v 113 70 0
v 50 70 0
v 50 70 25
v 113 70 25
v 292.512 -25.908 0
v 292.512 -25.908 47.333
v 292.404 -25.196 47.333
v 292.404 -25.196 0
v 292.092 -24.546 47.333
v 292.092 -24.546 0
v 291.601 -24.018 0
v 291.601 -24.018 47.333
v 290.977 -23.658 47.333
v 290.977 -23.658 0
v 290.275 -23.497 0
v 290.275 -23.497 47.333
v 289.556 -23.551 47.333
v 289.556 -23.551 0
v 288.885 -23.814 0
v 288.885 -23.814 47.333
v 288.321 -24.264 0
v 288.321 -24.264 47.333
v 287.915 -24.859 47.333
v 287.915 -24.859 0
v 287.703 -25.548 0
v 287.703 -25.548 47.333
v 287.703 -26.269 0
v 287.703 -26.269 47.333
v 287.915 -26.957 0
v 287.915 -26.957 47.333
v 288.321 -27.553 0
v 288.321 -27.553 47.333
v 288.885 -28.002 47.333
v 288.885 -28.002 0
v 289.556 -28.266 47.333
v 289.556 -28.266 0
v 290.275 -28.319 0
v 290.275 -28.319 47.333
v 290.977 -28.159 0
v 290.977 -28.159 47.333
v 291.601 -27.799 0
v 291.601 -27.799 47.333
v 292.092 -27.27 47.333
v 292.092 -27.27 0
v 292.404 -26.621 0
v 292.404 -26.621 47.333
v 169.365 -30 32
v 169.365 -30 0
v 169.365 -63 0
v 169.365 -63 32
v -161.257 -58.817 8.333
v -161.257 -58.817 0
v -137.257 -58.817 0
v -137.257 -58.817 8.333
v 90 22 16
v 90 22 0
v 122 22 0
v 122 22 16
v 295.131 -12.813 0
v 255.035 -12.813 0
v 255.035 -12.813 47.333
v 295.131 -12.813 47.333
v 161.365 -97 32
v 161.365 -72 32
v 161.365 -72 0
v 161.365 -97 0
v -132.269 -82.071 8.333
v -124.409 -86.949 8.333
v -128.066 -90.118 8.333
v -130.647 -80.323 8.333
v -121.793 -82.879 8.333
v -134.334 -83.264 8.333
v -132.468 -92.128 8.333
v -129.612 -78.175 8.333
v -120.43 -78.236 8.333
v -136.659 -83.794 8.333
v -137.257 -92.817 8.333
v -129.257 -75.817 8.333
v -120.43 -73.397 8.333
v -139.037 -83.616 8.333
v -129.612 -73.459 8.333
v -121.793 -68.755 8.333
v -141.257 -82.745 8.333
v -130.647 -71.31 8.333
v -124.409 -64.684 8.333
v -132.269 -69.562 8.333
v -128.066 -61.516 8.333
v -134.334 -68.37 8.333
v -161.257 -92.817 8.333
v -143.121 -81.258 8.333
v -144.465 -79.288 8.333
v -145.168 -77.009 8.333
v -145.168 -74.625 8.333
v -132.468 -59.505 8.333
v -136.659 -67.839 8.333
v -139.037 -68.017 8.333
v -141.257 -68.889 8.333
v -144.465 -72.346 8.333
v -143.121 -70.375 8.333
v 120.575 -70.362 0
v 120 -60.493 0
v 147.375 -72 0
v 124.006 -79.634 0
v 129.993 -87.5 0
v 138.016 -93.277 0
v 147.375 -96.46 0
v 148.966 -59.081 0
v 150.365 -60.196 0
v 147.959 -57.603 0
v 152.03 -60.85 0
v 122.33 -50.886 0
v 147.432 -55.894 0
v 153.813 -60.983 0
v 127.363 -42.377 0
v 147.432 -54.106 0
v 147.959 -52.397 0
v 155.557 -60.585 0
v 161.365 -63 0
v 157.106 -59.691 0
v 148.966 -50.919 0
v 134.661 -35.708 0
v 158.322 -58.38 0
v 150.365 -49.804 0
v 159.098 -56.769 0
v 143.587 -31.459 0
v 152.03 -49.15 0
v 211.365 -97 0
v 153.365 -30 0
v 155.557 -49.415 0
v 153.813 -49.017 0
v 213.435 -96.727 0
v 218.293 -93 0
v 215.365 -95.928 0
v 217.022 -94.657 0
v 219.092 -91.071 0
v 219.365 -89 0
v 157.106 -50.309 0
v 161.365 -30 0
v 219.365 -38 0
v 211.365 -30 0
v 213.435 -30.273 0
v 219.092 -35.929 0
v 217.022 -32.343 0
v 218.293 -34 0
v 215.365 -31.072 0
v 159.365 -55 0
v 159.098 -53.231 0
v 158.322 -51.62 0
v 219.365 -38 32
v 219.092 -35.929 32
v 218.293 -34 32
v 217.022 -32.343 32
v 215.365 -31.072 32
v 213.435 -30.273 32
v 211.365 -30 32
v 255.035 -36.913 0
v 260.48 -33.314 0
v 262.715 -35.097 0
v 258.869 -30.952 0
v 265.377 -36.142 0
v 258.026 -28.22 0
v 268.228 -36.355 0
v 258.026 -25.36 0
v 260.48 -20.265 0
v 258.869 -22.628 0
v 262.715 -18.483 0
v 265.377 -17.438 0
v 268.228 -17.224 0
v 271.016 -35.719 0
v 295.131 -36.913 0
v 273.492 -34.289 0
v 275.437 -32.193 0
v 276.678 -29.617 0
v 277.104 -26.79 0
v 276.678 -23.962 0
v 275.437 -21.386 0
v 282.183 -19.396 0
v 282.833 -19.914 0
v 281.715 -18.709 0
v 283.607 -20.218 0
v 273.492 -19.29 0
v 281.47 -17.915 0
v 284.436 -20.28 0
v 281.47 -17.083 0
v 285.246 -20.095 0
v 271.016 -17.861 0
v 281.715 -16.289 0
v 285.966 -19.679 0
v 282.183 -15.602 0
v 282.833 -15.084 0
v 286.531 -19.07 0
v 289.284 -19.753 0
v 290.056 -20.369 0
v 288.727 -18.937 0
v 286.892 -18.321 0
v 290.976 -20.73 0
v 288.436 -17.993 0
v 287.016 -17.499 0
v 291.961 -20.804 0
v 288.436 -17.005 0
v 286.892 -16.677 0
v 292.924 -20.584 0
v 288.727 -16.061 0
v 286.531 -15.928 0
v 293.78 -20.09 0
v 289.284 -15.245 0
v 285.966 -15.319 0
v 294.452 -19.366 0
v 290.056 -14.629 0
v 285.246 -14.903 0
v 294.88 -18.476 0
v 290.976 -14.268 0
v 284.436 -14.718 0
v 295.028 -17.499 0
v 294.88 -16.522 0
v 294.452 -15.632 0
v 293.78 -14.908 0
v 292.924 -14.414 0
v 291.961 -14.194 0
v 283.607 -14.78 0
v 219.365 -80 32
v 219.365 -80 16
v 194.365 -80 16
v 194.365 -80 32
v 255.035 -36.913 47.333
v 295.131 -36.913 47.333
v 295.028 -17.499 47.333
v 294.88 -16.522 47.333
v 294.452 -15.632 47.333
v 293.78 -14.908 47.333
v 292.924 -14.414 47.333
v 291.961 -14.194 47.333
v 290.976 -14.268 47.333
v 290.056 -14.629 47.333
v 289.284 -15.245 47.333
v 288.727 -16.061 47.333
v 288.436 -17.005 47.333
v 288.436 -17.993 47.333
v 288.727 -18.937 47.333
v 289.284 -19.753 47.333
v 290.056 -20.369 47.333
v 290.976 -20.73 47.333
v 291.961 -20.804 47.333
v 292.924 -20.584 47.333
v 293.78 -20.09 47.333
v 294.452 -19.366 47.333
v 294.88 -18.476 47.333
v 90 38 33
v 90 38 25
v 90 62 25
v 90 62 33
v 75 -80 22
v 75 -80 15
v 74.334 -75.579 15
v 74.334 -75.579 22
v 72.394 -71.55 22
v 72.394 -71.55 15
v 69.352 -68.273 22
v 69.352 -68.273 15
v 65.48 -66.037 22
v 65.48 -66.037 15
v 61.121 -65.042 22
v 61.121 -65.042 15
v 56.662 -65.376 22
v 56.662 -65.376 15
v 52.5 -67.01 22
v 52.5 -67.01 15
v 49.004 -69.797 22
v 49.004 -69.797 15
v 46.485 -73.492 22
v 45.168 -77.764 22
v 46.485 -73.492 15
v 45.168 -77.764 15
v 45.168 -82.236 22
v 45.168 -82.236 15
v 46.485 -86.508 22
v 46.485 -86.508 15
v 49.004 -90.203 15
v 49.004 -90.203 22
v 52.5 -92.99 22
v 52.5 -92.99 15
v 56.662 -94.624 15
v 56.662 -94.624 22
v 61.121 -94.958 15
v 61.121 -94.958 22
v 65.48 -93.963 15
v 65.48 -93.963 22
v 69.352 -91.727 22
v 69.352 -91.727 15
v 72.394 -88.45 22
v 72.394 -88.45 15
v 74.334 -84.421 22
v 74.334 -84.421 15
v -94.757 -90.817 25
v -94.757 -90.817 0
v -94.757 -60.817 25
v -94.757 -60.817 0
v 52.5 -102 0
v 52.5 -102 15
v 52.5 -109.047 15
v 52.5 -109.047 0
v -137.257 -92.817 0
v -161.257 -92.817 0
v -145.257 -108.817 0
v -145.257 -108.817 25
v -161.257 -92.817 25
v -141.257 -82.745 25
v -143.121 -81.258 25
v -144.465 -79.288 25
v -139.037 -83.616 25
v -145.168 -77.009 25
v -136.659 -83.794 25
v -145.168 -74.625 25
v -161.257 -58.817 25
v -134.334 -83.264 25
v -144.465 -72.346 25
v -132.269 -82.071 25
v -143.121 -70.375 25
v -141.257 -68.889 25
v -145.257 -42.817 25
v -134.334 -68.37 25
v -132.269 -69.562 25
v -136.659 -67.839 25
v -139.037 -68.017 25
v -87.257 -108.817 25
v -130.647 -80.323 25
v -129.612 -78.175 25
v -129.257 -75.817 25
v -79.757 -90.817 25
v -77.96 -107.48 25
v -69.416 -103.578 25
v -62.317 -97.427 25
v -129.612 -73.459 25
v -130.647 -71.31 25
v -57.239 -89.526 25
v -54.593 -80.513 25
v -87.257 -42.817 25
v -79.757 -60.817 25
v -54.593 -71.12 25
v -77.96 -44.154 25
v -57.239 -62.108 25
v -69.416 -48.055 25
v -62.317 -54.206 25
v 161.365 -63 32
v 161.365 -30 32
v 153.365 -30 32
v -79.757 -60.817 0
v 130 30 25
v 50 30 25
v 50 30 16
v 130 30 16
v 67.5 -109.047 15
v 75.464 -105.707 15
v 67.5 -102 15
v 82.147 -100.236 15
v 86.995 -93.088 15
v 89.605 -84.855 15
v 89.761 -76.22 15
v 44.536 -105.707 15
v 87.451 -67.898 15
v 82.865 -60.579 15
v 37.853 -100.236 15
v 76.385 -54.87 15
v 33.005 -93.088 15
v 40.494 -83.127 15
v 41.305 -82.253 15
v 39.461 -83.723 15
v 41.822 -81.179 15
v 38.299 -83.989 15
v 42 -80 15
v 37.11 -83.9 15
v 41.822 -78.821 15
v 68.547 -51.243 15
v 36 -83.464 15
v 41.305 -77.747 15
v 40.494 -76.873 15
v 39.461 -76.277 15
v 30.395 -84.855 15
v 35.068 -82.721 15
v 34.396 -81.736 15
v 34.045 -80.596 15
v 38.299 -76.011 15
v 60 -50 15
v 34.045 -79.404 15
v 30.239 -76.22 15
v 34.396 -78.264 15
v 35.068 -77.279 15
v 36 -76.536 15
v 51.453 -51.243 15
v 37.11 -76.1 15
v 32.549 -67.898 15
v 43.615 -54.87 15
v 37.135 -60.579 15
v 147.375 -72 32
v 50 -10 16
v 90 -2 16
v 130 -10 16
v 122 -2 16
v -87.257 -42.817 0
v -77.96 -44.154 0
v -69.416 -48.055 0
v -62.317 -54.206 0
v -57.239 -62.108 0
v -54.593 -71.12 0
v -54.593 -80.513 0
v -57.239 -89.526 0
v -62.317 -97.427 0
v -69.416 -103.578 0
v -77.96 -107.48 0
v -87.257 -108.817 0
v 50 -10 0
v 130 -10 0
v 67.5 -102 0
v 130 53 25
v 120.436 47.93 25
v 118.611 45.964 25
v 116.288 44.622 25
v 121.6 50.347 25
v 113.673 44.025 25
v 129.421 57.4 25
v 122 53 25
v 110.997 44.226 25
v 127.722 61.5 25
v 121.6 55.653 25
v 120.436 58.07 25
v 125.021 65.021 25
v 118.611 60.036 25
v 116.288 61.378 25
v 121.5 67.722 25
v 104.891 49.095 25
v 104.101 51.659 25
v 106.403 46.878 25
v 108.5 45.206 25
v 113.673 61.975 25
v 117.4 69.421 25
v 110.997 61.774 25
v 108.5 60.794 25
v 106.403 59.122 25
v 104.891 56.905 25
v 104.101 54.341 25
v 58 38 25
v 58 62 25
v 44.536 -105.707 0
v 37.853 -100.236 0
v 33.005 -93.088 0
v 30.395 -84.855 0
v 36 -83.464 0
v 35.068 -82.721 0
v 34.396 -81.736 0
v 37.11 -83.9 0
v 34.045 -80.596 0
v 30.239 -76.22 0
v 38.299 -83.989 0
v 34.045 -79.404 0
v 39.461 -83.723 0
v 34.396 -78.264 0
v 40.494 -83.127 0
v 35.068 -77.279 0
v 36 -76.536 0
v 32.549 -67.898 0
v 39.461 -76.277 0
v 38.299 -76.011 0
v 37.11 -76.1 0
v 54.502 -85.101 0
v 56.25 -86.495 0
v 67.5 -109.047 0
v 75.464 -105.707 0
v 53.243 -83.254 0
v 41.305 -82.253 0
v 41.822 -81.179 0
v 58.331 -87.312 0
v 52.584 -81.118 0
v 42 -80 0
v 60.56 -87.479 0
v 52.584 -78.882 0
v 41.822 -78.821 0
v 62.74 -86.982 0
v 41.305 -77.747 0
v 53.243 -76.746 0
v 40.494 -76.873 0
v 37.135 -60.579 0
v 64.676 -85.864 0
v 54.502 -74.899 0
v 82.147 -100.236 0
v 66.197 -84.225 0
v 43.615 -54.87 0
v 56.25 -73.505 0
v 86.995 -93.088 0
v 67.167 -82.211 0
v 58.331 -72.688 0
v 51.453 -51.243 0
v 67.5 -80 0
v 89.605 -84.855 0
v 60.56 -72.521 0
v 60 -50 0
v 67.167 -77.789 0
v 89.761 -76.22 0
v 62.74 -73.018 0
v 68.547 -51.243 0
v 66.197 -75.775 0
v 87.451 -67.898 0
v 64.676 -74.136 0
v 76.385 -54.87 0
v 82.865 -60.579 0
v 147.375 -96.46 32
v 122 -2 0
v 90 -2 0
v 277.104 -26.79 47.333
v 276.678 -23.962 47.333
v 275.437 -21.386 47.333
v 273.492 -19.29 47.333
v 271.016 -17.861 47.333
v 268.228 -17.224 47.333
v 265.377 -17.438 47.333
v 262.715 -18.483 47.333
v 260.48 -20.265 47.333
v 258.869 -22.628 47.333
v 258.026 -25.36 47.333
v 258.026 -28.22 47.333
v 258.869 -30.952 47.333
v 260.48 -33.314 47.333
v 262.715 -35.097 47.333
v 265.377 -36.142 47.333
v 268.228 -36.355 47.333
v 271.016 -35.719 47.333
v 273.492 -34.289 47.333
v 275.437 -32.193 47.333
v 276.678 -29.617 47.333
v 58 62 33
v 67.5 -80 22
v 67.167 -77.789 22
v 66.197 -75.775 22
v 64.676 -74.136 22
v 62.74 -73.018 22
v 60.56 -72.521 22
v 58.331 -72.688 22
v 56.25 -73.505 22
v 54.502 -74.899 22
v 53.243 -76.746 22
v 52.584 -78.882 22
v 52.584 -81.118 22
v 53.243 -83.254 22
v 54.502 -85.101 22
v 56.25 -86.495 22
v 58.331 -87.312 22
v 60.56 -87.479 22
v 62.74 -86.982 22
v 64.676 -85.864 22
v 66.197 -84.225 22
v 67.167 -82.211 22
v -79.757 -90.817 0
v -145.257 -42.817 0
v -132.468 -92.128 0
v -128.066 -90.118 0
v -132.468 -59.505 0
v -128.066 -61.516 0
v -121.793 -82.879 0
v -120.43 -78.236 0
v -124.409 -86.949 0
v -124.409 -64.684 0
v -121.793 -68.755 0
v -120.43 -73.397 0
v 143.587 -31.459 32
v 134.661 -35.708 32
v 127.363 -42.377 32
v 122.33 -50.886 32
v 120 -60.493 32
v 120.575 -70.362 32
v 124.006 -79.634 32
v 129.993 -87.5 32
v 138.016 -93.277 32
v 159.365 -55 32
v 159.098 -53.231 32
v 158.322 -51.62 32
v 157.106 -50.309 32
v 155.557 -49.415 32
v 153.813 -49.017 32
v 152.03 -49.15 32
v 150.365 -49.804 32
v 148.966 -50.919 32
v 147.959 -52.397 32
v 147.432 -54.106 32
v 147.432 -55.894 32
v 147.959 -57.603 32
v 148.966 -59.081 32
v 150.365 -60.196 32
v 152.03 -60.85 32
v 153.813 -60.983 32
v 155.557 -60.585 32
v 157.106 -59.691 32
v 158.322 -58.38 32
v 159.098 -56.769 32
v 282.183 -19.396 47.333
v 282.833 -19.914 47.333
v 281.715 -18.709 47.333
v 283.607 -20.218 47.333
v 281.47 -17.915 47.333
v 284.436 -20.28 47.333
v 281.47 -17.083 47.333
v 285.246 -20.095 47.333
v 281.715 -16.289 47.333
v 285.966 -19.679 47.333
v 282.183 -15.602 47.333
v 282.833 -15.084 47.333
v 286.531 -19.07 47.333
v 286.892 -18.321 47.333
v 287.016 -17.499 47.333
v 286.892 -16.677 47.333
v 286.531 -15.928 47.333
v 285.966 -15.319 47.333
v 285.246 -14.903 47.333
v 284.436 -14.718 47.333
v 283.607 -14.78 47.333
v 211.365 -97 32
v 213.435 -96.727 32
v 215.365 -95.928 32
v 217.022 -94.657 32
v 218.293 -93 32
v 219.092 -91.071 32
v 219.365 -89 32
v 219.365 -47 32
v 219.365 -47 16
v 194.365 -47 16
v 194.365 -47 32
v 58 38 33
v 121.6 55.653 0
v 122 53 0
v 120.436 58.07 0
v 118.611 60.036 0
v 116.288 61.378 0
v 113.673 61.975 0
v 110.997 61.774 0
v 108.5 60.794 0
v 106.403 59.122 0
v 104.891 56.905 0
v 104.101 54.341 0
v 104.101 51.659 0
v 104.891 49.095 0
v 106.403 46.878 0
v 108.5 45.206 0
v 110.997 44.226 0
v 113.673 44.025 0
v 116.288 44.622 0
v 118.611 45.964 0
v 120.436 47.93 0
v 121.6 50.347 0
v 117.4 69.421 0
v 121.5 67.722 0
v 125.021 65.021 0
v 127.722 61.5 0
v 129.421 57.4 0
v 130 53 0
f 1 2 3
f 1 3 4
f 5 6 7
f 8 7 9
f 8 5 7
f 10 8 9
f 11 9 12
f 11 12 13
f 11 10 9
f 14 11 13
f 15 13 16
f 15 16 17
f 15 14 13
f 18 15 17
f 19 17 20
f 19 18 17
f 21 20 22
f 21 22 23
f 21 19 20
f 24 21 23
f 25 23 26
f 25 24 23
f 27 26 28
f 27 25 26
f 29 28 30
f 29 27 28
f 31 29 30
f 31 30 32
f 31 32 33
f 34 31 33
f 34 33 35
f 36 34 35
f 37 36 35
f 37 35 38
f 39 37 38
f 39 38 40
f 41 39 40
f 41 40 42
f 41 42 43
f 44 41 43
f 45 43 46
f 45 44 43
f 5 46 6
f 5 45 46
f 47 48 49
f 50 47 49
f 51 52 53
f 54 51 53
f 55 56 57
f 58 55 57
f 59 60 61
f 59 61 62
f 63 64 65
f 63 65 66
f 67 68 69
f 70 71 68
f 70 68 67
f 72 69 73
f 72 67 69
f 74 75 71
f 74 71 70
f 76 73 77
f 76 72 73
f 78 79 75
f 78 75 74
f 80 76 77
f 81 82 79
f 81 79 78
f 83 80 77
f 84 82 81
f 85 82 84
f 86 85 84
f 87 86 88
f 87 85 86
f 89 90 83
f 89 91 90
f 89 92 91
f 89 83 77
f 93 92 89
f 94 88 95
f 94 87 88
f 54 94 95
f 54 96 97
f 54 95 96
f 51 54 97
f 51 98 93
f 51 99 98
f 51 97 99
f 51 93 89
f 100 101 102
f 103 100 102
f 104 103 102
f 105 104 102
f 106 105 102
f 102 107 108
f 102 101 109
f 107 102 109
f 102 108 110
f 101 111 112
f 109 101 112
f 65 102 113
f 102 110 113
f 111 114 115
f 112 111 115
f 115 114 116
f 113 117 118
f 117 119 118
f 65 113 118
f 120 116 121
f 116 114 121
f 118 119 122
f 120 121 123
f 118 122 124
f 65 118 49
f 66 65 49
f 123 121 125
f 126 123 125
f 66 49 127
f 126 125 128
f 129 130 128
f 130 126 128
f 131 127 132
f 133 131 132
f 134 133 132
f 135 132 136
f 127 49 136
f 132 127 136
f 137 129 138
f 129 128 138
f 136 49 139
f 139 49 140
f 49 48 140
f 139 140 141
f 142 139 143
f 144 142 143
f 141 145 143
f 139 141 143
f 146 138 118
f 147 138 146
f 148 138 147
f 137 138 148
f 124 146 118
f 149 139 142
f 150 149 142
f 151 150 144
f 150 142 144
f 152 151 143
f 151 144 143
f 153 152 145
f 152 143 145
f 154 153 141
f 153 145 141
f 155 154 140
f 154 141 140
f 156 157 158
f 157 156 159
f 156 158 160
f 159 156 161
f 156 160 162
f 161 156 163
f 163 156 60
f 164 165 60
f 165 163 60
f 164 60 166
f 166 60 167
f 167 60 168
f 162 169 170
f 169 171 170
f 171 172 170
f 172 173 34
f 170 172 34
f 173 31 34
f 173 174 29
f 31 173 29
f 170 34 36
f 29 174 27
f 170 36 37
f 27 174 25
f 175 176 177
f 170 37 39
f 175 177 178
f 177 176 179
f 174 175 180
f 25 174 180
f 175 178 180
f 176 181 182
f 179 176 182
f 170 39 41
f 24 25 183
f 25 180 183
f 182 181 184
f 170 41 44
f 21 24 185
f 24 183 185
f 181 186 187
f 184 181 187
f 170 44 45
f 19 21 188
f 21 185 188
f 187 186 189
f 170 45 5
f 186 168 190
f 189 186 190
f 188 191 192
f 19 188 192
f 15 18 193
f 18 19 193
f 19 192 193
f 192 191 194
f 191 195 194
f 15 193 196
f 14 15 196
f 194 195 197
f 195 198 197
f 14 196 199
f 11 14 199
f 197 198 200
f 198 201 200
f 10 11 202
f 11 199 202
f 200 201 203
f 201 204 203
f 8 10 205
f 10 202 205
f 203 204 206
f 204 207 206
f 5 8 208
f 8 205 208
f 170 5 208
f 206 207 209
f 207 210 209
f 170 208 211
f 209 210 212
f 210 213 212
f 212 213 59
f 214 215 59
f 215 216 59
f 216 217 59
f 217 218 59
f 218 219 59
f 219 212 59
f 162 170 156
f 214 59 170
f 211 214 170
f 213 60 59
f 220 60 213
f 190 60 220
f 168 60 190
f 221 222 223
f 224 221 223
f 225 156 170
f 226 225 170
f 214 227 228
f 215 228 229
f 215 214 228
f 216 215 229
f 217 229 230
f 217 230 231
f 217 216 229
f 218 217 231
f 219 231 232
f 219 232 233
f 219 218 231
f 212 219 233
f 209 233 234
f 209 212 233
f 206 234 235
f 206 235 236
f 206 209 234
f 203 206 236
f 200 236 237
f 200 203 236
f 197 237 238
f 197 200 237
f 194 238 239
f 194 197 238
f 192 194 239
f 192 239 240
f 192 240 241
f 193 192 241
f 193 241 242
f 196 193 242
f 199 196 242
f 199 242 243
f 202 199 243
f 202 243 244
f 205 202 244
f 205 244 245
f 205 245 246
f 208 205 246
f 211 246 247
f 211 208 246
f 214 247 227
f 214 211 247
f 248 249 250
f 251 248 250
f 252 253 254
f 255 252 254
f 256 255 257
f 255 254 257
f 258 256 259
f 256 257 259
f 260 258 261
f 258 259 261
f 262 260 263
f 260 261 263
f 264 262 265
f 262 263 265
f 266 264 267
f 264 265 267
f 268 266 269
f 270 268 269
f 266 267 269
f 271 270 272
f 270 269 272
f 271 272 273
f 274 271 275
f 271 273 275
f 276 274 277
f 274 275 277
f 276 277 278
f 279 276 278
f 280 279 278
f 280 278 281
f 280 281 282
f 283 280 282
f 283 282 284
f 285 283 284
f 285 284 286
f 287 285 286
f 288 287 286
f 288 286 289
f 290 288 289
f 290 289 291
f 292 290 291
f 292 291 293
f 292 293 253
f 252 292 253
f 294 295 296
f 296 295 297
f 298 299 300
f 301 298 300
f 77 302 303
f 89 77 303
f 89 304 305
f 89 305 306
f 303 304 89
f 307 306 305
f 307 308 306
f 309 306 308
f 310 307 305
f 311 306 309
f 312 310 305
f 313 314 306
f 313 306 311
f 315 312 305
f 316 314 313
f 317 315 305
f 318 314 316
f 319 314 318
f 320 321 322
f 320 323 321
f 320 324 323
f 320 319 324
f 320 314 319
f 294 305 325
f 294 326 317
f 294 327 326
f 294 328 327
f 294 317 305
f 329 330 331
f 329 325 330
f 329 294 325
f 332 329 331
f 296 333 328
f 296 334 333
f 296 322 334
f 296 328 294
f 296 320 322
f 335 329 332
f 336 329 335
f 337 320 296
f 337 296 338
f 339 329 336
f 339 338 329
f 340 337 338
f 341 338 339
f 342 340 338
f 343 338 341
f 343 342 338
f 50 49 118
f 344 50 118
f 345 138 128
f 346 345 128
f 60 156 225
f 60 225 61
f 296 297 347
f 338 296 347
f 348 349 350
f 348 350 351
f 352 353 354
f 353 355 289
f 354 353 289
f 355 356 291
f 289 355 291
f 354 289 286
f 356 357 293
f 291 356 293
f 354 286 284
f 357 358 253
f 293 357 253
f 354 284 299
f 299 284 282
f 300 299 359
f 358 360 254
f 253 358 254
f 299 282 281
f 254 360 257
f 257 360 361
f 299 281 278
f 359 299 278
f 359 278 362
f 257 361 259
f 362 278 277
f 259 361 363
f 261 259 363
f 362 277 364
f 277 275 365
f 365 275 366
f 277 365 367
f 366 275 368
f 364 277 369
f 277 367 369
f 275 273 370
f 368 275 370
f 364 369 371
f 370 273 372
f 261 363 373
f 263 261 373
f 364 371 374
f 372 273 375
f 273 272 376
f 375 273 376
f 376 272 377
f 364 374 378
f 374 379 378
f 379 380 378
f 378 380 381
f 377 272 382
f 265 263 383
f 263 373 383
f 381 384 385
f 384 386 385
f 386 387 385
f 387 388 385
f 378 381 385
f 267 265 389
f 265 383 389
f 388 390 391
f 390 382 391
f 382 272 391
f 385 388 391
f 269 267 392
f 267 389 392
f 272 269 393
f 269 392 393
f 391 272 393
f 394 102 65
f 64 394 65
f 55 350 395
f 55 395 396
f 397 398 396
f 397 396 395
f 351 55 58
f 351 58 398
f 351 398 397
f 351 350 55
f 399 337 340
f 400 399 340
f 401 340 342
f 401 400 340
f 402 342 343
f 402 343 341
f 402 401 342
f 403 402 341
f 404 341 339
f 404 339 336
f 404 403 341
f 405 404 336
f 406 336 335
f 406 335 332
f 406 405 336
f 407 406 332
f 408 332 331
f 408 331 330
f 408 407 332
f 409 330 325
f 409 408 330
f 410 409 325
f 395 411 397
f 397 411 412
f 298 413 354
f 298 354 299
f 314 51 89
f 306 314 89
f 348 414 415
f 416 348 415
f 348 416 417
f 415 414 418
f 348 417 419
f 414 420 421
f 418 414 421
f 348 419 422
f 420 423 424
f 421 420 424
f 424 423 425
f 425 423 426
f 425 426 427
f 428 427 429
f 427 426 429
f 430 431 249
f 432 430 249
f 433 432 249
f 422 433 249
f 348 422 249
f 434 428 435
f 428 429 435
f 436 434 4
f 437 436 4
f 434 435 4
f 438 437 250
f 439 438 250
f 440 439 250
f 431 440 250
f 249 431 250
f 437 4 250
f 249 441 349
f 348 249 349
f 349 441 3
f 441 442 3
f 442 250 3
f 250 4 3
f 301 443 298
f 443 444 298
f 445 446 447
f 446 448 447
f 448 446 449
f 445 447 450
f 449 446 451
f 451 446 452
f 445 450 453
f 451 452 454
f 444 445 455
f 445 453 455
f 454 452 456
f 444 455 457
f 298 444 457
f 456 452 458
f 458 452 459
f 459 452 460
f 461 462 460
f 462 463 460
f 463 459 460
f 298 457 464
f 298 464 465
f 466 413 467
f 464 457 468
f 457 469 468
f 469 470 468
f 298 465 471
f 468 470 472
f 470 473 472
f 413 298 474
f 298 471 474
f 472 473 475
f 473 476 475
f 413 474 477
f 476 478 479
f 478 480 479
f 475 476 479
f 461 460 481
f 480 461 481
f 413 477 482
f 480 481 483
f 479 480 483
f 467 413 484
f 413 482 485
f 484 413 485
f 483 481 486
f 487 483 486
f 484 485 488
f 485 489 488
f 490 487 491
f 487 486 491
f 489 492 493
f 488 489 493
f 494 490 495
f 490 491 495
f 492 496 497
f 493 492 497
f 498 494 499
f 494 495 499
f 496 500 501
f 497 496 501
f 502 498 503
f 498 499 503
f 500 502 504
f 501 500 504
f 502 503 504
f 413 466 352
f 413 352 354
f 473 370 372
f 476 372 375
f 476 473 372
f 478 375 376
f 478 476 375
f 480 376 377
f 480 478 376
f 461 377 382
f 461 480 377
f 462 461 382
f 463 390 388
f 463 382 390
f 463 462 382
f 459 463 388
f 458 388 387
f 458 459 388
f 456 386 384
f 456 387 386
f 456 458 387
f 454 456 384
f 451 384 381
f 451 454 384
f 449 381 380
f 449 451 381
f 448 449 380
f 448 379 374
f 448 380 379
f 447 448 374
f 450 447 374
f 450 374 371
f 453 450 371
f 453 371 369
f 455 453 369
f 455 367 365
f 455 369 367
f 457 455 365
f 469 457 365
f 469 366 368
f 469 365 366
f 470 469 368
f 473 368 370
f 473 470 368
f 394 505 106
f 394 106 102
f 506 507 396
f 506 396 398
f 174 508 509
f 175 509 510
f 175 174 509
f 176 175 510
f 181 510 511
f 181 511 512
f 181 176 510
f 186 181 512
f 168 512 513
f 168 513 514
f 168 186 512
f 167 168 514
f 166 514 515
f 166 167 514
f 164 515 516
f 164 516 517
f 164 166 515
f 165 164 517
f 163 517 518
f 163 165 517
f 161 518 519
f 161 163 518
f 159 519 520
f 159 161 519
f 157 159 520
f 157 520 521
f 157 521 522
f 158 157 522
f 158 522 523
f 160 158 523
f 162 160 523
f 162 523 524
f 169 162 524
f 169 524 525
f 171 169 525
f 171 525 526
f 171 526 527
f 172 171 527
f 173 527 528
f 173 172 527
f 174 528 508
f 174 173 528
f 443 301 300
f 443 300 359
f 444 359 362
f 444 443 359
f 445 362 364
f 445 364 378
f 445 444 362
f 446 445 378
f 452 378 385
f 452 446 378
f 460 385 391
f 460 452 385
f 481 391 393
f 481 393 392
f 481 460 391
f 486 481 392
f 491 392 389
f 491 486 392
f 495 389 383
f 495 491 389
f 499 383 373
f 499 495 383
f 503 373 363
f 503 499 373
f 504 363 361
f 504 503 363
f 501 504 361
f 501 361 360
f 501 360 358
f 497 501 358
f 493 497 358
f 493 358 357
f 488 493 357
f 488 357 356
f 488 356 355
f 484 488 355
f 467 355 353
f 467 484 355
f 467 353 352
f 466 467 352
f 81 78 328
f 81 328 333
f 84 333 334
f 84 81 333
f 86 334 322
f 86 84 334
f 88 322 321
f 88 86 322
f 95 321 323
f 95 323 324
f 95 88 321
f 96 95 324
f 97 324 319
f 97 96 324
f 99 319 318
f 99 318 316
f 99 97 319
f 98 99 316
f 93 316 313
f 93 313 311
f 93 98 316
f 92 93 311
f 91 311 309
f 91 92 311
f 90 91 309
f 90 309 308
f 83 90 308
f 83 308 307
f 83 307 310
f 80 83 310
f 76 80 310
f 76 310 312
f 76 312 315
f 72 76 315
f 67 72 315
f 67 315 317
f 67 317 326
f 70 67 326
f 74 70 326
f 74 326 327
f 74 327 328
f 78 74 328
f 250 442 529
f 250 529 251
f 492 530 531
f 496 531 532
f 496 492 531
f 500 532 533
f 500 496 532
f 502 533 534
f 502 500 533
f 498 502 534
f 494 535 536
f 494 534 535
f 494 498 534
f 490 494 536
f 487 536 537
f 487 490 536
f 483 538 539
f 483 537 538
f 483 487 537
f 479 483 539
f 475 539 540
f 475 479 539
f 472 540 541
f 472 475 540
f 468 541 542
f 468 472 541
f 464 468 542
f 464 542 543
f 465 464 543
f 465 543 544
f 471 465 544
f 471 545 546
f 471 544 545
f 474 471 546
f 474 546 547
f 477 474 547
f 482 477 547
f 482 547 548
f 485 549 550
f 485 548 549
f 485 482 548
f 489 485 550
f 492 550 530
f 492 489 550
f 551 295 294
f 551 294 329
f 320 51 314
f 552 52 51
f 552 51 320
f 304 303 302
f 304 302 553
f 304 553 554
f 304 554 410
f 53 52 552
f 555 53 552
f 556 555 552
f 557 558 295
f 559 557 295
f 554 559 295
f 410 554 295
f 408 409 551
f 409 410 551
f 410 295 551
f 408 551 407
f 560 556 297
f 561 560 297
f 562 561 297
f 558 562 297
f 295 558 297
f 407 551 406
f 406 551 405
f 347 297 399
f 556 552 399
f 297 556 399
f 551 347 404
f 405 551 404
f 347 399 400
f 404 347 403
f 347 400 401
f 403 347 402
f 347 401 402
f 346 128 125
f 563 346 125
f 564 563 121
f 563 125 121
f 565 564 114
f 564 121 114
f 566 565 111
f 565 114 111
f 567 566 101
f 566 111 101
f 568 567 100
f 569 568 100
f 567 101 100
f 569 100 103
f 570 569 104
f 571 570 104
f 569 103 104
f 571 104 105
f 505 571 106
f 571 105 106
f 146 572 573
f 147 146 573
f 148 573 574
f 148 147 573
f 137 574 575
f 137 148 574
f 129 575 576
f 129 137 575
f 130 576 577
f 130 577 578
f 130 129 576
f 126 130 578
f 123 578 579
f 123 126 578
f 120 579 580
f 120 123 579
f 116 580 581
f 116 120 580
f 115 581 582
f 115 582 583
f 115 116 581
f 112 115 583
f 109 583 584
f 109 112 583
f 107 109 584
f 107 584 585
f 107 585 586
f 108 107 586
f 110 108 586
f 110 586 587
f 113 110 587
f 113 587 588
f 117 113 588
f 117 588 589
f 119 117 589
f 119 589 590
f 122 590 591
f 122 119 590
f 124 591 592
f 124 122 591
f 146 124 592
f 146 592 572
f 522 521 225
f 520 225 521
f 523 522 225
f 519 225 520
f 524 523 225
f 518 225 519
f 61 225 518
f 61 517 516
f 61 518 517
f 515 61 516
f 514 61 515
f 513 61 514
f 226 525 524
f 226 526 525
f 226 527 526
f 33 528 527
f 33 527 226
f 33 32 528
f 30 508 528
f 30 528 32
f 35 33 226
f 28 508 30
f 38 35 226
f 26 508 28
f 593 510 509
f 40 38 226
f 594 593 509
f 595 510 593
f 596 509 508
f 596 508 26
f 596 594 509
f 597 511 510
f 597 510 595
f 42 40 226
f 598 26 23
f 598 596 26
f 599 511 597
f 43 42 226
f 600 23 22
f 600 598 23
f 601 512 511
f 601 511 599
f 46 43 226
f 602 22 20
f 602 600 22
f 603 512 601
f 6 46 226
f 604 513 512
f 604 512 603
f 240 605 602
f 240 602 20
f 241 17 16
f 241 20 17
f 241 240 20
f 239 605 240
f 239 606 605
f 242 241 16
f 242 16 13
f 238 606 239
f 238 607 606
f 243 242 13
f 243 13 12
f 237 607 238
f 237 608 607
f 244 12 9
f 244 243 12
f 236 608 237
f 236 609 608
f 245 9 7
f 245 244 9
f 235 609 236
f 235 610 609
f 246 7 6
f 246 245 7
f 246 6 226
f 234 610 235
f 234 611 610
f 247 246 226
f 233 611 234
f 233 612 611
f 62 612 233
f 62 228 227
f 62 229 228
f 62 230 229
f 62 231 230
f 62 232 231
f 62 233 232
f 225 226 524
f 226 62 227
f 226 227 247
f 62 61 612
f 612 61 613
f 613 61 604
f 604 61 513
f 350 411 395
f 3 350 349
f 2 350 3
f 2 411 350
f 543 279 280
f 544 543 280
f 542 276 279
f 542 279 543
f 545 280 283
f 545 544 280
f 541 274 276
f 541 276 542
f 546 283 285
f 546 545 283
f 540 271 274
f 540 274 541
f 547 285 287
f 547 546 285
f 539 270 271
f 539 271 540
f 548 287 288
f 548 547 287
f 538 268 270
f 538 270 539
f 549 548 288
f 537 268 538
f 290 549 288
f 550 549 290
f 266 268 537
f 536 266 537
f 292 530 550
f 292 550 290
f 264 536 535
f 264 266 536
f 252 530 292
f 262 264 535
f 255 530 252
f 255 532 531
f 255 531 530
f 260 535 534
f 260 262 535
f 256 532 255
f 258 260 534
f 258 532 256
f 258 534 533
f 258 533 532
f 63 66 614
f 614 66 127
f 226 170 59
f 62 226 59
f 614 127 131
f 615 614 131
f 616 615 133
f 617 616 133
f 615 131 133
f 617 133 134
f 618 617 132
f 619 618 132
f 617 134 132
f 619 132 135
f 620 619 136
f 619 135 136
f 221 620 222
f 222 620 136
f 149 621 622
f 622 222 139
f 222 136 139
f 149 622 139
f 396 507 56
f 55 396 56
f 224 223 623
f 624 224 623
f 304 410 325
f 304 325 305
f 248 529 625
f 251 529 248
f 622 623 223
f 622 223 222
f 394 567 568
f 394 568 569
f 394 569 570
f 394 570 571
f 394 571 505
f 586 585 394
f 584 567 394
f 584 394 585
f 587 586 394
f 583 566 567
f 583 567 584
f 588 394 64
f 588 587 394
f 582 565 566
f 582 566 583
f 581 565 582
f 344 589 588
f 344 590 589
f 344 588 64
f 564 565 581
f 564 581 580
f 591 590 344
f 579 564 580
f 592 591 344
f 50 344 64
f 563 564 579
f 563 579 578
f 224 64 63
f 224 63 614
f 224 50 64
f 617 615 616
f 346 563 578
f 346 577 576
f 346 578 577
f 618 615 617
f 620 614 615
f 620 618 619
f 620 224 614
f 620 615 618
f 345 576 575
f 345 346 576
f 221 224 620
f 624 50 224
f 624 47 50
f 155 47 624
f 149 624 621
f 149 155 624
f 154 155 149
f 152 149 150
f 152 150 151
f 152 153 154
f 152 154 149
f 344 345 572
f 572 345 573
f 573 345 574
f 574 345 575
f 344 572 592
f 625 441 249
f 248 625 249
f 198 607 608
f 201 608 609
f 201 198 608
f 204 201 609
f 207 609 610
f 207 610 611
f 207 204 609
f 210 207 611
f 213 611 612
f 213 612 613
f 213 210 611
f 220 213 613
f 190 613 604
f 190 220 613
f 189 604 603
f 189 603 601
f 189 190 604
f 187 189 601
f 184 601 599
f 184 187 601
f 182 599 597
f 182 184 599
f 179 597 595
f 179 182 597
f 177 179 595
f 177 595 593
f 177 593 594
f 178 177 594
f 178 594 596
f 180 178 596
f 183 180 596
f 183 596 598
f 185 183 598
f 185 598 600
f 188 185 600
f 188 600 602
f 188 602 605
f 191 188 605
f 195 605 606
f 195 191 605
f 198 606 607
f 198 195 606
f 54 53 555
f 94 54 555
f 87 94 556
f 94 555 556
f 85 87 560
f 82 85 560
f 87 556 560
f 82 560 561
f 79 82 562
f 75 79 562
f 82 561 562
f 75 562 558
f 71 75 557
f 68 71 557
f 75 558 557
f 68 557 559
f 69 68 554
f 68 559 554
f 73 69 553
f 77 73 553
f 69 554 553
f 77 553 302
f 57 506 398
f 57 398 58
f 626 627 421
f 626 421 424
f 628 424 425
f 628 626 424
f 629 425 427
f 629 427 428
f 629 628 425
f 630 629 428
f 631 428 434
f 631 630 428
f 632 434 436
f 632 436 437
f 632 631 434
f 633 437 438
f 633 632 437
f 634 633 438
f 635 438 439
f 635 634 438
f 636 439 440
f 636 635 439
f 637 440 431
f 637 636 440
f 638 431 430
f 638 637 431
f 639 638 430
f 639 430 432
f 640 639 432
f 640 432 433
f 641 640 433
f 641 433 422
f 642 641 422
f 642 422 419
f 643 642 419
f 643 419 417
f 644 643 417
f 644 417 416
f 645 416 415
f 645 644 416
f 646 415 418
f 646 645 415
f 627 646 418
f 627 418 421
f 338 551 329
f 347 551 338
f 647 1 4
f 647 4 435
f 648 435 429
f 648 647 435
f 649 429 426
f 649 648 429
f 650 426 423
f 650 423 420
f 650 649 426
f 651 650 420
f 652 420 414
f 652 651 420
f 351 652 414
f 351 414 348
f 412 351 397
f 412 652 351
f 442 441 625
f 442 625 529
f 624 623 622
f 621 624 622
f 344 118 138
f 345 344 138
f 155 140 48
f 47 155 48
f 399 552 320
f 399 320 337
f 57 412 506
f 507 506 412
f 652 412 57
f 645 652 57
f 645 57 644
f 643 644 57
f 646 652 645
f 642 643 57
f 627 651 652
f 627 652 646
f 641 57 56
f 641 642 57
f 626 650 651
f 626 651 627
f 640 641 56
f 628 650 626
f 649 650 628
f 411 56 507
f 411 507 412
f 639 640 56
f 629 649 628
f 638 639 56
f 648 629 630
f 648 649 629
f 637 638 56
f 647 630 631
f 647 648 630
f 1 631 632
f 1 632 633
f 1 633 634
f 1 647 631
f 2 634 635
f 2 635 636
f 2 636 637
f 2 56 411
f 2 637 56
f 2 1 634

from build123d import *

# Parameters (mm, degrees)
CROQUIS3_W               = 32
CROQUIS3_H               = 24
CROQUIS3_R               = 9
SALIENTE_EXTRUIR4_DEPTH  = 25
CROQUIS3_5_W             = 80
CROQUIS3_5_H             = 40
CROQUIS3_5_W_2           = 32
CROQUIS3_5_H_2           = 24
SALIENTE_EXTRUIR5_DEPTH  = 33
CROQUIS5_W               = 80
CROQUIS5_H               = 40
CORTAR_EXTRUIR1_DEPTH    = 17
CROQUIS3_11_W            = 32
CROQUIS3_11_H            = 24
CORTAR_EXTRUIR2_DEPTH    = 30
SALIENTE_EXTRUIR6_DEPTH  = 15
CROQUIS8_4_R             = 15
SALIENTE_EXTRUIR7_DEPTH  = 22
CROQUIS8_6_R             = 4
CORTAR_EXTRUIR5_DEPTH    = 48
CROQUIS8_7_R             = 7.5
CORTAR_EXTRUIR6_DEPTH    = 48
CROQUIS9_R               = 6
SALIENTE_EXTRUIR8_DEPTH  = 32
CROQUIS9_3_W             = 25
CROQUIS9_3_H             = 33
SALIENTE_EXTRUIR9_DEPTH  = 16
SALIENTE_EXTRUIR11_DEPTH = 25
CROQUIS10_4_W            = 15
CROQUIS10_4_H            = 30
CORTAR_EXTRUIR7_DEPTH    = 25
CROQUIS10_5_R            = 8
CORTAR_EXTRUIR8_DEPTH    = 25
CORTAR_EXTRUIR9_DEPTH    = 8.333333333
CROQUIS14_W              = 40.09551918
CROQUIS14_H              = 24.100376272
CROQUIS14_R              = 3.314232671
CROQUIS14_R_2            = 9.592276939
CROQUIS14_R_3            = 2.417801169
CROQUIS14_R_4            = 2.788674417
SALIENTE_EXTRUIR12_DEPTH = 47.333333333


with BuildPart() as part:
    # Croquis3 → Saliente-Extruir4 (new body)
    with BuildSketch(Plane.XY):
        with BuildLine():
            Line((113, 70), (50, 70))
            Line((50, 70), (50, 30))
            Line((50, 30), (130, 30))
            Line((130, 30), (130, 53))
            ThreePointArc((130, 53), (125.02081528, 65.02081528), (113, 70))
        make_face()
        with Locations((74, 50)):
            Rectangle(CROQUIS3_W, CROQUIS3_H, mode=Mode.SUBTRACT)
        with Locations((113, 53)):
            Circle(CROQUIS3_R, mode=Mode.SUBTRACT)
    extrude(amount=SALIENTE_EXTRUIR4_DEPTH)

    # Croquis3<5> → Saliente-Extruir5 (add)
    with BuildSketch(Plane.XY):
        with Locations((90, 10)):
            Rectangle(CROQUIS3_5_W, CROQUIS3_5_H)
        with Locations((74, 50)):
            Rectangle(CROQUIS3_5_W_2, CROQUIS3_5_H_2)
    extrude(amount=SALIENTE_EXTRUIR5_DEPTH)

    # Croquis5 → Cortar-Extruir1 (cut)
    with BuildSketch(Plane.XY.offset(33)):
        with Locations((90, 10)):
            Rectangle(CROQUIS5_W, CROQUIS5_H)
    extrude(amount=-CORTAR_EXTRUIR1_DEPTH, mode=Mode.SUBTRACT)

    # Croquis3<11> → Cortar-Extruir2 (cut)
    with BuildSketch(Plane.XY):
        with Locations((106, 10)):
            Rectangle(CROQUIS3_11_W, CROQUIS3_11_H)
    extrude(amount=CORTAR_EXTRUIR2_DEPTH, mode=Mode.SUBTRACT)


with BuildPart() as body_2:
    # Croquis8 → Saliente-Extruir6 (new body)
    with BuildSketch(Plane.XY):
        with BuildLine():
            Line((52.5, -102), (52.5, -109.047375097))
            ThreePointArc((52.5, -109.047375097), (60, -50), (67.5, -109.047375097))
            Line((67.5, -109.047375097), (67.5, -102))
            Line((67.5, -102), (52.5, -102))
        make_face()
    extrude(amount=SALIENTE_EXTRUIR6_DEPTH)

    # Croquis8<4> → Saliente-Extruir7 (add)
    with BuildSketch(Plane.XY):
        with Locations((60, -80)):
            Circle(CROQUIS8_4_R)
    extrude(amount=SALIENTE_EXTRUIR7_DEPTH)

    # Croquis8<6> → Cortar-Extruir5 (cut)
    with BuildSketch(Plane.XY):
        with Locations((38, -80)):
            Circle(CROQUIS8_6_R)
    extrude(amount=CORTAR_EXTRUIR5_DEPTH, mode=Mode.SUBTRACT)

    # Croquis8<7> → Cortar-Extruir6 (cut)
    with BuildSketch(Plane.XY):
        with Locations((60, -80)):
            Circle(CROQUIS8_7_R)
    extrude(amount=CORTAR_EXTRUIR6_DEPTH, mode=Mode.SUBTRACT)


with BuildPart() as body_3:
    # Croquis9 → Saliente-Extruir8 (new body)
    with BuildSketch(Plane.XY):
        with BuildLine():
            Line((161.364777361, -63), (161.364777361, -30))
            Line((161.364777361, -30), (153.364774009, -30))
            ThreePointArc((153.364774009, -30), (120, -60.493069396), (147.375187785, -96.460200496))
            Line((147.375187785, -96.460200496), (147.375187785, -72))
            Line((147.375187785, -72), (161.364777361, -72))
            Line((161.364777361, -72), (161.364777361, -97))
            Line((161.364777361, -97), (211.364777361, -97))
            ThreePointArc((211.364777361, -97), (217.02163161, -94.656854249), (219.364777361, -89))
            Line((219.364777361, -89), (219.364777361, -80))
            Line((219.364777361, -80), (194.364777361, -80))
            Line((194.364777361, -80), (194.364777361, -47))
            Line((194.364777361, -47), (219.364777361, -47))
            Line((219.364777361, -47), (219.364777361, -38))
            ThreePointArc((219.364777361, -38), (217.02163161, -32.343145751), (211.364777361, -30))
            Line((211.364777361, -30), (169.364777361, -30))
            Line((169.364777361, -30), (169.364777361, -63))
            Line((169.364777361, -63), (161.364777361, -63))
        make_face()
        with Locations((153.364777361, -55)):
            Circle(CROQUIS9_R, mode=Mode.SUBTRACT)
    extrude(amount=SALIENTE_EXTRUIR8_DEPTH)

    # Croquis9<3> → Saliente-Extruir9 (add)
    with BuildSketch(Plane.XY):
        with Locations((206.864777361, -63.5)):
            Rectangle(CROQUIS9_3_W, CROQUIS9_3_H)
    extrude(amount=SALIENTE_EXTRUIR9_DEPTH)


with BuildPart() as body_4:
    # Croquis10 → Saliente-Extruir11 (new body)
    with BuildSketch(Plane.XY):
        with BuildLine():
            Line((-161.257005587, -58.81683994), (-161.257005587, -92.81683994))
            Line((-161.257005587, -92.81683994), (-145.257005587, -108.81683994))
            Line((-145.257005587, -108.81683994), (-87.257005587, -108.81683994))
            ThreePointArc((-87.257005587, -108.81683994), (-54.257005587, -75.81683994), (-87.257005587, -42.81683994))
            Line((-87.257005587, -42.81683994), (-145.257005587, -42.81683994))
            Line((-145.257005587, -42.81683994), (-161.257005587, -58.81683994))
        make_face()
    extrude(amount=SALIENTE_EXTRUIR11_DEPTH)

    # Croquis10<4> → Cortar-Extruir7 (cut)
    with BuildSketch(Plane.XY):
        with Locations((-87.257005587, -75.81683994)):
            Rectangle(CROQUIS10_4_W, CROQUIS10_4_H)
    extrude(amount=CORTAR_EXTRUIR7_DEPTH, mode=Mode.SUBTRACT)

    # Croquis10<5> → Cortar-Extruir8 (cut)
    with BuildSketch(Plane.XY):
        with Locations((-137.257005587, -75.81683994)):
            Circle(CROQUIS10_5_R)
    extrude(amount=CORTAR_EXTRUIR8_DEPTH, mode=Mode.SUBTRACT)

    # Croquis13 → Cortar-Extruir9 (cut)
    with BuildSketch(Plane(origin=(0, 0, 0), x_dir=(-1, 0, 0), z_dir=(0, 0, -1))):
        with BuildLine():
            Line((161.257005587, -58.81683994), (137.257005587, -58.81683994))
            ThreePointArc((137.257005587, -58.81683994), (120.257005587, -75.81683994), (137.257005587, -92.81683994))
            Line((137.257005587, -92.81683994), (161.257005587, -92.81683994))
            Line((161.257005587, -92.81683994), (175.725705877, -74.246739019))
            Line((175.725705877, -74.246739019), (161.257005587, -58.81683994))
        make_face()
    extrude(amount=-CORTAR_EXTRUIR9_DEPTH, mode=Mode.SUBTRACT)


with BuildPart() as body_5:
    # Croquis14 → Saliente-Extruir12 (new body)
    with BuildSketch(Plane.XY):
        with Locations((275.083226021, -24.863179811)):
            Rectangle(CROQUIS14_W, CROQUIS14_H)
        with Locations((291.713457486, -17.498948227)):
            Circle(CROQUIS14_R, mode=Mode.SUBTRACT)
        with Locations((267.511415727, -26.7898702)):
            Circle(CROQUIS14_R_2, mode=Mode.SUBTRACT)
        with Locations((290.093853848, -25.908331949)):
            Circle(CROQUIS14_R_3, mode=Mode.SUBTRACT)
        with Locations((284.227163487, -17.498948227)):
            Circle(CROQUIS14_R_4, mode=Mode.SUBTRACT)
    extrude(amount=SALIENTE_EXTRUIR12_DEPTH)


solid = Compound([part.part, body_2.part, body_3.part, body_4.part, body_5.part])
